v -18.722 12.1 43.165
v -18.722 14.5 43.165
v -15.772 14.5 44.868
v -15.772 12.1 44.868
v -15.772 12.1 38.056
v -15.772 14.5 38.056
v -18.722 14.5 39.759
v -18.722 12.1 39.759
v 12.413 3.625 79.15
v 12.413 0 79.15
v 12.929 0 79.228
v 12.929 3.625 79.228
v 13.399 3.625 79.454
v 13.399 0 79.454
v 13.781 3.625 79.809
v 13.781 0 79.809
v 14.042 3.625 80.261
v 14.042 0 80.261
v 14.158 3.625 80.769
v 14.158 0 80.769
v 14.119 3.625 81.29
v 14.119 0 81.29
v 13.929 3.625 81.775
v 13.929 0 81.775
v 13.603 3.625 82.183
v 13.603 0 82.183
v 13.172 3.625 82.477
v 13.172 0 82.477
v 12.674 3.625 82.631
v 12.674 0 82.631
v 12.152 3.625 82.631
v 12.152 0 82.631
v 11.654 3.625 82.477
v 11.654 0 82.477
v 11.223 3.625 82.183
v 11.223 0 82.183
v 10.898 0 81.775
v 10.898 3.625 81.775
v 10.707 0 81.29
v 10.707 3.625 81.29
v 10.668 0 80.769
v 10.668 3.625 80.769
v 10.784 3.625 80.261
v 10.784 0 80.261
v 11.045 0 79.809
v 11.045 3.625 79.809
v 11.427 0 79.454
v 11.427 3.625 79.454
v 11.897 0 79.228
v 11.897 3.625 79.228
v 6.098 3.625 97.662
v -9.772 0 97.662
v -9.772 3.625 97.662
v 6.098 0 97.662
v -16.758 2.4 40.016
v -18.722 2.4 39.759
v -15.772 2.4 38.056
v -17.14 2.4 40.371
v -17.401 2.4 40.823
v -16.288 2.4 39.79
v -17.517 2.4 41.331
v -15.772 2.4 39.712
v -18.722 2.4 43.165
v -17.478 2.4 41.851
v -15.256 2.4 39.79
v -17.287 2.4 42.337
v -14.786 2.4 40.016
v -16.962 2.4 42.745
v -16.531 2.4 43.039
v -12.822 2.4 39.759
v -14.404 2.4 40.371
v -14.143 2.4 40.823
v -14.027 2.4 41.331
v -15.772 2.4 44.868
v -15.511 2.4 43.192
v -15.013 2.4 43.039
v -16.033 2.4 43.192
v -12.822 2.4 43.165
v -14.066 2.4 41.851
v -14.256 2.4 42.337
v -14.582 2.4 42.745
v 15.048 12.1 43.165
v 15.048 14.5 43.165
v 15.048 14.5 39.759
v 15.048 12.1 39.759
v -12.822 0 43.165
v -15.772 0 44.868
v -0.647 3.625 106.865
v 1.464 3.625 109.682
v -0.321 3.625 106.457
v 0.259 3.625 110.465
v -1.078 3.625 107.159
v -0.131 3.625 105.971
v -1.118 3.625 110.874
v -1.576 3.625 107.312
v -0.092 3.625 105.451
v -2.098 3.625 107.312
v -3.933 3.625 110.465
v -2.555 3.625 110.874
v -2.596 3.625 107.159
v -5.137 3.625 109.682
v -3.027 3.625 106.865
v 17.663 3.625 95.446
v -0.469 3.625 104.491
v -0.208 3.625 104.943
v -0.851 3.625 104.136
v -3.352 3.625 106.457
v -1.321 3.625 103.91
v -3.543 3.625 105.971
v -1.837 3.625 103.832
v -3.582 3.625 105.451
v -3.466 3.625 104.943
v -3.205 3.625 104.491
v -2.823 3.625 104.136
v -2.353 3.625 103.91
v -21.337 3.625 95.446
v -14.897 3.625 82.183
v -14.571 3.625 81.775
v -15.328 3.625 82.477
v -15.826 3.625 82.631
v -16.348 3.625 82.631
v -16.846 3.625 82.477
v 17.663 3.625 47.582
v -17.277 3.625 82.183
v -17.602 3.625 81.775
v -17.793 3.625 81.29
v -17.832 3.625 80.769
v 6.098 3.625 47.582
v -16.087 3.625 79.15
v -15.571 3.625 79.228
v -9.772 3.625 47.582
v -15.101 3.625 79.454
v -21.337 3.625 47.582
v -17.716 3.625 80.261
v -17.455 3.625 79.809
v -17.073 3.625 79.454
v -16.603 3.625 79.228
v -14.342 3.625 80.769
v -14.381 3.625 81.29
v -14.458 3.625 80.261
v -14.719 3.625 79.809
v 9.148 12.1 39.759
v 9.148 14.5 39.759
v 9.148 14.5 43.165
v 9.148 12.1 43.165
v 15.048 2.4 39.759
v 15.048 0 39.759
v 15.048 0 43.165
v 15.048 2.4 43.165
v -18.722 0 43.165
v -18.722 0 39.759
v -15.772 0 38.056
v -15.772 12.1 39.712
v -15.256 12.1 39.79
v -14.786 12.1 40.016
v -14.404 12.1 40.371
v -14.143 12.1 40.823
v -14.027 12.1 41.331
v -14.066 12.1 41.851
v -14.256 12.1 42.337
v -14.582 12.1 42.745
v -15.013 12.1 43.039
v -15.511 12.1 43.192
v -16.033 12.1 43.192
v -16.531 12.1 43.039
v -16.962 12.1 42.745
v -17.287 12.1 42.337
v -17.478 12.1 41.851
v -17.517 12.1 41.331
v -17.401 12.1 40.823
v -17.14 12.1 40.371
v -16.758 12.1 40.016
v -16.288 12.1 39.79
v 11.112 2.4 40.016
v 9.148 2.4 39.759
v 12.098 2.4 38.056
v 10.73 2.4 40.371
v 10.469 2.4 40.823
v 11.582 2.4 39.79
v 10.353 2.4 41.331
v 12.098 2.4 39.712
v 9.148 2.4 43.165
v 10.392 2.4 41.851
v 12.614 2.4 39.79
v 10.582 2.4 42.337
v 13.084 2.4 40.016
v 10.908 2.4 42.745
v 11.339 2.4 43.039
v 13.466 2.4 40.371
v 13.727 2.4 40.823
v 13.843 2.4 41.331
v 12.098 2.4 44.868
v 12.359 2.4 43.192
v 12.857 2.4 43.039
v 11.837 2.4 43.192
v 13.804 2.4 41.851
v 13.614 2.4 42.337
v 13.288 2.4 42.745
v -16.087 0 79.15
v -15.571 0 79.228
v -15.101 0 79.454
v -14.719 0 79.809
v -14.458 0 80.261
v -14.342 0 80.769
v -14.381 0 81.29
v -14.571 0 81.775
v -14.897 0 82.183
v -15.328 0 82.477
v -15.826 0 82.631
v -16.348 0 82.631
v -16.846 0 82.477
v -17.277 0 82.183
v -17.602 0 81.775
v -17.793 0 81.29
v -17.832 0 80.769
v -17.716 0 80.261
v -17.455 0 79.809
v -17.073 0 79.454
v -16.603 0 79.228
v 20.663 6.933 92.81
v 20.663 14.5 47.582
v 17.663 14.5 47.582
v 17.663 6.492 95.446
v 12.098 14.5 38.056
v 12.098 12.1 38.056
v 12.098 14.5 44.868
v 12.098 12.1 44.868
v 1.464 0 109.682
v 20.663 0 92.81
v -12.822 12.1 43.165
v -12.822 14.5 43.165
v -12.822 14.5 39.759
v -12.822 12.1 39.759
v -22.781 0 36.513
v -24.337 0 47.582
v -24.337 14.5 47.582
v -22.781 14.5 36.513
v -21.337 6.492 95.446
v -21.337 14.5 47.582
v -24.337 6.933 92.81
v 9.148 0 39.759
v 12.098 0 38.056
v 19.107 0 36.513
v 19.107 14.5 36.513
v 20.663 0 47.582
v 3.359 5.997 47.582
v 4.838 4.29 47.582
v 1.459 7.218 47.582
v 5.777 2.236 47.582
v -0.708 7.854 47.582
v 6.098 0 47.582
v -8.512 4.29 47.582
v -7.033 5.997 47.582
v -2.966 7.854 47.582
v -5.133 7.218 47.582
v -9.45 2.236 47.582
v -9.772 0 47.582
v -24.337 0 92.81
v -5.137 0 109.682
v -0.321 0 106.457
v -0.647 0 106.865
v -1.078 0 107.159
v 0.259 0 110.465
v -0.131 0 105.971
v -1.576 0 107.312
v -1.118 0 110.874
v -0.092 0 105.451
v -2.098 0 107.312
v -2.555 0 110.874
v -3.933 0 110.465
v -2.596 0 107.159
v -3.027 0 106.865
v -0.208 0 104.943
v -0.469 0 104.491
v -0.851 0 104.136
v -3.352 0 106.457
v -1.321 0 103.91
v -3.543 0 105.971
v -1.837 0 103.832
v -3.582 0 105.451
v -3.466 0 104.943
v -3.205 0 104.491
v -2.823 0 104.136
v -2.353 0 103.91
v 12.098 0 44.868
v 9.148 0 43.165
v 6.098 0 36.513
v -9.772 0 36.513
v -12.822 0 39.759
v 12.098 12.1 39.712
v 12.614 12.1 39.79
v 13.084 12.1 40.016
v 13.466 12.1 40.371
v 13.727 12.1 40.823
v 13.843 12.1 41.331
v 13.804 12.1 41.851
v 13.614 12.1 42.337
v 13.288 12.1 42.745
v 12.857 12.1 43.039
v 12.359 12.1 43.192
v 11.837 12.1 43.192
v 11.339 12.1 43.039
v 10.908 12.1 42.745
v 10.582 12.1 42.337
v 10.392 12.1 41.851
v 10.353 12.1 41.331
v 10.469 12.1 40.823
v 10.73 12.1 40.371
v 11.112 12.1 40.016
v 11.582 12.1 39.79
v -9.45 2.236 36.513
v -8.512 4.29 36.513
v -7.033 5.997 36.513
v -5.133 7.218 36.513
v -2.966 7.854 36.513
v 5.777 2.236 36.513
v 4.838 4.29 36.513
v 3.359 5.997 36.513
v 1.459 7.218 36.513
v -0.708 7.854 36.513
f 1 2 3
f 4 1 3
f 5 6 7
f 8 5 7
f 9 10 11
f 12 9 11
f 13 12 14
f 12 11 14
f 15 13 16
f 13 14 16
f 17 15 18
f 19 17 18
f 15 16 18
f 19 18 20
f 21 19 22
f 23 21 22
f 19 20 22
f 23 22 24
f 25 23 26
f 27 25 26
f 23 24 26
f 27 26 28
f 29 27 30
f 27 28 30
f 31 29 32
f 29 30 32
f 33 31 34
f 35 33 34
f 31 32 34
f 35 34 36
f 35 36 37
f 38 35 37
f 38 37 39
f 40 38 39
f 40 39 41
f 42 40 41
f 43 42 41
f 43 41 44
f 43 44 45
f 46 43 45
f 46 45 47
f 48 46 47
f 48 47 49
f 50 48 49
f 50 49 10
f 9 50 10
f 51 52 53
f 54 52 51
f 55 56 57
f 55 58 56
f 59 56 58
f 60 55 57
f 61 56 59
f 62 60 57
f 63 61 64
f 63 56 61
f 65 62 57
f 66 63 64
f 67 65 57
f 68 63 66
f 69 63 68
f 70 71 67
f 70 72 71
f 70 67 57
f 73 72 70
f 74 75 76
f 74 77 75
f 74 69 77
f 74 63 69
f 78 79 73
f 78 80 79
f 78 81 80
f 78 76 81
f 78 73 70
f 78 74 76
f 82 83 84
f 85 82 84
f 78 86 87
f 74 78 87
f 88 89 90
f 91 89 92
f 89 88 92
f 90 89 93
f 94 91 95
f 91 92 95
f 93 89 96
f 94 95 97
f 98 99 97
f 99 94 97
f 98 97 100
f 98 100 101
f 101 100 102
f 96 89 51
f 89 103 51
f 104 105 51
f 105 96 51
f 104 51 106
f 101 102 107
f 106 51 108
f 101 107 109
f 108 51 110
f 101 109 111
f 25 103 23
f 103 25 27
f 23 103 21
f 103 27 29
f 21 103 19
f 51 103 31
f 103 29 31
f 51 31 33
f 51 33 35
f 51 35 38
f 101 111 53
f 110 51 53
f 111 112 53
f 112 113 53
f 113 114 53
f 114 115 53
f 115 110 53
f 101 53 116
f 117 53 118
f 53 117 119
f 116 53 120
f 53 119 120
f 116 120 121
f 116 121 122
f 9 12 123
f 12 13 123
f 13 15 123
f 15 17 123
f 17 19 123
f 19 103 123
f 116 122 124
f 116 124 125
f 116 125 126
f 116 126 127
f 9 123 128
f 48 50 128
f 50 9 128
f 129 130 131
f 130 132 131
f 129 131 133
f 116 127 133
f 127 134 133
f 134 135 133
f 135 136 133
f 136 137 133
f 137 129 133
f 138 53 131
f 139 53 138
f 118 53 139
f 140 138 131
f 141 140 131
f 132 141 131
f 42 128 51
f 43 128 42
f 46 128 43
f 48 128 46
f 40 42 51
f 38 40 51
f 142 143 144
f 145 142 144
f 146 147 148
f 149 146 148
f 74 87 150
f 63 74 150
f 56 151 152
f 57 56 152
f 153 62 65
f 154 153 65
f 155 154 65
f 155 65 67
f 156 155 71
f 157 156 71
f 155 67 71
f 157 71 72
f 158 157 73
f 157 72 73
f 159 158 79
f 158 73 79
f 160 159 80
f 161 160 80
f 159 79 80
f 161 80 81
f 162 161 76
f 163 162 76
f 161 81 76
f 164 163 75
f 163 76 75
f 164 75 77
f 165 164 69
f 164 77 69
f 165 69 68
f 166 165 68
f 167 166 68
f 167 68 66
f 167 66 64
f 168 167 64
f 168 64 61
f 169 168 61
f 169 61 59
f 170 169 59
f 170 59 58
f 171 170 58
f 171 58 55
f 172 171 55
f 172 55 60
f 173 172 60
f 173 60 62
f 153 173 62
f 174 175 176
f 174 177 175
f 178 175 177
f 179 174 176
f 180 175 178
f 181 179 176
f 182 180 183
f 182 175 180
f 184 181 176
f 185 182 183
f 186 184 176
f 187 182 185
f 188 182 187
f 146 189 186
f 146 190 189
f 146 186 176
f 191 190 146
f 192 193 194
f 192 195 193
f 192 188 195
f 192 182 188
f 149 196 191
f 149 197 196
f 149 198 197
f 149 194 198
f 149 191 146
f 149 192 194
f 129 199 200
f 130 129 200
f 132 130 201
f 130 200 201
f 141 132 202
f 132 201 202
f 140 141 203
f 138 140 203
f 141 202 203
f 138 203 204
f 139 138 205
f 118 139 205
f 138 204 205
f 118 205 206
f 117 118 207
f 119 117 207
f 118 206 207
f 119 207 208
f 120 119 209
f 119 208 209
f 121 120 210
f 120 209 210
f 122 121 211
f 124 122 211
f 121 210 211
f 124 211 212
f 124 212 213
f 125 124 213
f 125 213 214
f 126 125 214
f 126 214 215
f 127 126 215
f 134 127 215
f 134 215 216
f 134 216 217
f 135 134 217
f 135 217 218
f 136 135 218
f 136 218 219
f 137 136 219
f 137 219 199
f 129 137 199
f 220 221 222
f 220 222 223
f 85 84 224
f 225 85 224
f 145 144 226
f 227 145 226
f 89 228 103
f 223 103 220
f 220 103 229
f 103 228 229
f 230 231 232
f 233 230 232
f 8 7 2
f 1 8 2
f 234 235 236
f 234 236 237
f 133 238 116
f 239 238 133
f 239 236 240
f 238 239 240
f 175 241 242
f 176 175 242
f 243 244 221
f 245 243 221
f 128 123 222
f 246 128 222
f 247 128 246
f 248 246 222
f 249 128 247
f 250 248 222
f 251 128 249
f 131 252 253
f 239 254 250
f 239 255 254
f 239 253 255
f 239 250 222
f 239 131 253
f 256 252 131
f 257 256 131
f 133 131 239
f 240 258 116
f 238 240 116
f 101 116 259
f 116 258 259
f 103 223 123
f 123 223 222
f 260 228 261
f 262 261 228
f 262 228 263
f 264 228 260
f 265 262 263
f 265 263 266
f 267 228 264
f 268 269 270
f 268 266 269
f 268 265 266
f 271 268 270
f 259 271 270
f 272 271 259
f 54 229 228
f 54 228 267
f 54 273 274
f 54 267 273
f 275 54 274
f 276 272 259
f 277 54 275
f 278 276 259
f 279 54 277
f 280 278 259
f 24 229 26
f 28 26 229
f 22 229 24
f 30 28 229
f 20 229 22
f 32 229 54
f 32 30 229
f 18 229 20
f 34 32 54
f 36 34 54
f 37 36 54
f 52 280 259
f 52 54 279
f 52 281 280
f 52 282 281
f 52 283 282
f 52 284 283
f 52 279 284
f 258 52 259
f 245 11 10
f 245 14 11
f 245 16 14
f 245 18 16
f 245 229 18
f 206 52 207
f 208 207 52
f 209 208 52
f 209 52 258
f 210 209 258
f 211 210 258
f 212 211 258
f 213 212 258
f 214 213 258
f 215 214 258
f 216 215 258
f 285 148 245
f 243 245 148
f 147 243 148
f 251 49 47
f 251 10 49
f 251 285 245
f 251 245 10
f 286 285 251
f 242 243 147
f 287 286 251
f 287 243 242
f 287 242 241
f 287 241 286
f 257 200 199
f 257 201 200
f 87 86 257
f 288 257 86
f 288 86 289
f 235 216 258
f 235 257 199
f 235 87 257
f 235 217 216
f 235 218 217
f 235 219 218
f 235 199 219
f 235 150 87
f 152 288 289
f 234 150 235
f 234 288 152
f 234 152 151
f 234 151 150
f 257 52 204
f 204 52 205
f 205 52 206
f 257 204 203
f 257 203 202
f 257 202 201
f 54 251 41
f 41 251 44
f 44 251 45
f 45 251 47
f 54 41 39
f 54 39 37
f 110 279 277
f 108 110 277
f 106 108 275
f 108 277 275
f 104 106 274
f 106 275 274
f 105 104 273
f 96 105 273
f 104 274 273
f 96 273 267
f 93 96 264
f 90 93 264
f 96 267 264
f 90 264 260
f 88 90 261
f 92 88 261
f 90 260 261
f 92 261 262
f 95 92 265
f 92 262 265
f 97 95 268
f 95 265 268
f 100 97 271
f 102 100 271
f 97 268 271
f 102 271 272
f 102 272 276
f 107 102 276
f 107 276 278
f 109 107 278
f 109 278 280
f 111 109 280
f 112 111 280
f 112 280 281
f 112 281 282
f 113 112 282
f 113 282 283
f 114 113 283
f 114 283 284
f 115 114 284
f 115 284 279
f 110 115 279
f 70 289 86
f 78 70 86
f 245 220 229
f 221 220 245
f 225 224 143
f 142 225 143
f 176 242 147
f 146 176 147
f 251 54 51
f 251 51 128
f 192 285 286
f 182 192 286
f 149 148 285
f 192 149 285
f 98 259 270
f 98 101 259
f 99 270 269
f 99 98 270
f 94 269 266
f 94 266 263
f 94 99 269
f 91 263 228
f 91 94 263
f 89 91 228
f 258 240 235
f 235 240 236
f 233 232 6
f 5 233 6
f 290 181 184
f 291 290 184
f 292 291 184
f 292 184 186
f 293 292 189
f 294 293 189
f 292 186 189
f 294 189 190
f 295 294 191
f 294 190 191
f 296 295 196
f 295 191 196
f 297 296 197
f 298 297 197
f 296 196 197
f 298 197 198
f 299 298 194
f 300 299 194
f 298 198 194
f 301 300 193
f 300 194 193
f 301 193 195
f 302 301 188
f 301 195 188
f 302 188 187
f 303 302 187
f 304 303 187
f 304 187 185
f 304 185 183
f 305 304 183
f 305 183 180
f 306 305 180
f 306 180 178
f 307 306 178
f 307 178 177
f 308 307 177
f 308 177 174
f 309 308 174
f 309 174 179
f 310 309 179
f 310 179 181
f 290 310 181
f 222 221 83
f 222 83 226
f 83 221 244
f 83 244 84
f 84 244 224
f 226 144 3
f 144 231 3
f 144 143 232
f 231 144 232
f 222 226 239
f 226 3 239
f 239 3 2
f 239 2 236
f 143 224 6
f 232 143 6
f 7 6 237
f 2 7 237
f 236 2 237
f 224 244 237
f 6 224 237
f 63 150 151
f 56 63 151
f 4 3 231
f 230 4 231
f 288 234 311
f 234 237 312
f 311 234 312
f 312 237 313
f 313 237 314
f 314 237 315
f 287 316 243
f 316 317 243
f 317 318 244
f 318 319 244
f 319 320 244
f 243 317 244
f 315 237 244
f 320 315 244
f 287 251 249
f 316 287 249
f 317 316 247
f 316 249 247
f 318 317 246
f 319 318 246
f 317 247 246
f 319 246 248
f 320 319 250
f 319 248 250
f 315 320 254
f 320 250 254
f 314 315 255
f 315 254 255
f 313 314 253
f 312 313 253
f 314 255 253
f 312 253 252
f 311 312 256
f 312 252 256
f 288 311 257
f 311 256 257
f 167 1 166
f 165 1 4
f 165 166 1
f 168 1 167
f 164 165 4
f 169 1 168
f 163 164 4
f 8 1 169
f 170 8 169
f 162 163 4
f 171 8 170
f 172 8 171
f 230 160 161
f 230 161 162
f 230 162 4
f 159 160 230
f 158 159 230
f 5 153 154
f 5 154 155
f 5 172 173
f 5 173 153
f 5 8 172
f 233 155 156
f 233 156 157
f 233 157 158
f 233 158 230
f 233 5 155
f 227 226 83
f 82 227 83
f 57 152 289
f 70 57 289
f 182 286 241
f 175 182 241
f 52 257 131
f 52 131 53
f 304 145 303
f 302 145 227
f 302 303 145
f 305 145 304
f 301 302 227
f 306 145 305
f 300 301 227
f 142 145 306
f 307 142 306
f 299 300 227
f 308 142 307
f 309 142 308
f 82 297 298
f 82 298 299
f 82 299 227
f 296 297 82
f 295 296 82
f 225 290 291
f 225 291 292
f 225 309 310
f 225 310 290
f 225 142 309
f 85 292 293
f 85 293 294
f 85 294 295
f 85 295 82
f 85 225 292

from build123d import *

# Parameters (mm, degrees)
BOSS_EXTRUDE3_DEPTH              = 14.5
SKETCH8_R                        = 7.935
CUT_EXTRUDE3_DEPTH               = 88
CUT_EXTRUDE9_DEPTH               = 2.4
F_39_0_13779528_DIAMETER_HOLE1_D = 3.500000112
CUT_EXTRUDE10_DEPTH              = 22.4
CUT_EXTRUDE11_DEPTH              = 2.4
BOSS_EXTRUDE7_DEPTH              = 3.625
F_39_0_13779528_DIAMETER_HOLE2_D = 3.500000112
BOSS_EXTRUDE10_DEPTH             = 3
BOSS_EXTRUDE11_DEPTH             = 3
CUT_EXTRUDE14_DEPTH              = 13
CUT_EXTRUDE15_DEPTH              = 13
FILLET1_R                        = 5


with BuildPart() as part:
    # Sketch6 → Boss-Extrude3 (new body)
    with BuildSketch(Plane(origin=(0, 0, 0), x_dir=(1, 0, 0), z_dir=(0, 1, 0))):
        Polygon((-16.836914056, 5.783353512), (13.163085944, 5.783353512), (20.663085944, -47.581919406), (-24.336914056, -47.581919406), align=None)
    extrude(amount=BOSS_EXTRUDE3_DEPTH)

    # Sketch8 → Cut-Extrude3 (cut)
    with BuildSketch(Plane.XY.offset(47.581919406)):
        with Locations((-1.836914056, 0)):
            Circle(SKETCH8_R)
    extrude(amount=-CUT_EXTRUDE3_DEPTH, mode=Mode.SUBTRACT)

    # Sketch18 → Cut-Extrude9 (cut)
    with BuildSketch(Plane(origin=(0, 14.5, 0), x_dir=(1, 0, 0), z_dir=(0, 1, 0))):
        Polygon((-15.771819769, -44.868285994), (-12.821819769, -43.1651027), (-12.821819769, -39.758736112), (-15.771819769, -38.055552818), (-18.721819769, -39.758736112), (-18.721819769, -43.1651027), align=None)
        Polygon((12.097991657, -44.868285994), (15.047991657, -43.1651027), (15.047991657, -39.758736112), (12.097991657, -38.055552818), (9.147991657, -39.758736112), (9.147991657, -43.1651027), align=None)
        Polygon((11.389331688, -26.016021021), (14.389331688, -24.283970214), (14.389331688, -20.819868599), (11.389331688, -19.087817791), (8.389331688, -20.819868599), (8.389331688, -24.283970214), align=None)
        Polygon((-15.0631598, -26.016021021), (-12.0631598, -24.283970214), (-12.0631598, -20.819868599), (-15.0631598, -19.087817791), (-18.0631598, -20.819868599), (-18.0631598, -24.283970214), align=None)
    extrude(amount=-CUT_EXTRUDE9_DEPTH, mode=Mode.SUBTRACT)

    # #39 (0.13779528) Diameter Hole1 (through all)
    with Locations(Plane(origin=(-15.0631598, 14.5, 22.551919406), x_dir=(0, 0, 1), z_dir=(0, 1, 0))):
        with Locations((0, 0), (0, 26.452491488), (18.91, -0.708659969), (18.91, 27.161151457)):
            Hole(F_39_0_13779528_DIAMETER_HOLE1_D / 2)

    # Sketch22 → Cut-Extrude10 (cut)
    with BuildSketch(Plane(origin=(0, 14.5, 0), x_dir=(1, 0, 0), z_dir=(0, 1, 0))):
        Polygon((-22.781301734, -36.51316259), (19.107473622, -36.51316259), (13.163085944, 5.783353512), (-16.836914056, 5.783353512), align=None)
    extrude(amount=-CUT_EXTRUDE10_DEPTH, mode=Mode.SUBTRACT)

    # Sketch24 → Cut-Extrude11 (cut)
    with BuildSketch(Plane.XZ):
        Polygon((-15.771819769, 38.055552818), (-12.821819769, 39.758736112), (-12.821819769, 43.1651027), (-15.771819769, 44.868285994), (-18.721819769, 43.1651027), (-18.721819769, 39.758736112), align=None)
        Polygon((12.097991657, 38.055552818), (15.047991657, 39.758736112), (15.047991657, 43.1651027), (12.097991657, 44.868285994), (9.147991657, 43.1651027), (9.147991657, 39.758736112), align=None)
    extrude(amount=-CUT_EXTRUDE11_DEPTH, mode=Mode.SUBTRACT)

    # Sketch27 → Boss-Extrude7 (add)
    with BuildSketch(Plane(origin=(0, 0, 0), x_dir=(1, 0, 0), z_dir=(0, 1, 0))):
        Polygon((6.098085944, -47.581919406), (20.663085944, -47.581919406), (20.663085944, -112.581919406), (-9.771914056, -112.581919406), (-24.336914056, -112.581919406), (-24.336914056, -47.581919406), (-9.771914056, -47.581919406), (-9.771914056, -97.661919406), (6.098085944, -97.661919406), align=None)
    extrude(amount=BOSS_EXTRUDE7_DEPTH)

    # #39 (0.13779528) Diameter Hole2 (through all)
    with Locations(Plane(origin=(-16.086914056, 3.625, 80.900195398), x_dir=(0, 0, 1), z_dir=(0, 1, 0))):
        with Locations((0, 0), (24.681724008, 14.25), (0, 28.5)):
            Hole(F_39_0_13779528_DIAMETER_HOLE2_D / 2)

    # Sketch39 → Boss-Extrude10 (add)
    with BuildSketch(Plane(origin=(20.663085944, 0, 0), x_dir=(0, 0, -1), z_dir=(1, 0, 0))):
        Polygon((-47.581919406, 14.5), (-112.581919406, 3.625), (-47.581919406, 3.625), align=None)
    extrude(amount=-BOSS_EXTRUDE10_DEPTH)

    # Sketch40 → Boss-Extrude11 (add)
    with BuildSketch(Plane.ZY.offset(24.336914056)):
        Polygon((47.581919406, 14.5), (112.581919406, 3.625), (47.581919406, 3.625), align=None)
    extrude(amount=-BOSS_EXTRUDE11_DEPTH)

    # Sketch43 → Cut-Extrude14 (cut)
    with BuildSketch(Plane.XZ):
        Polygon((-1.836914056, 112.581919406), (-24.336914056, 112.581919406), (-24.336914056, 92.810231668), align=None)
    extrude(amount=-CUT_EXTRUDE14_DEPTH, mode=Mode.SUBTRACT)

    # Sketch44 → Cut-Extrude15 (cut)
    with BuildSketch(Plane.XZ):
        Polygon((20.663085944, 92.810231668), (20.663085944, 112.581919406), (-1.836914056, 112.581919406), align=None)
    extrude(amount=-CUT_EXTRUDE15_DEPTH, mode=Mode.SUBTRACT)

    # Fillet1
    fillet1_edges = [part.edges().sort_by_distance(p)[0] for p in [
        (-1.836914056, 1.8125, 112.581919406),
    ]]
    fillet(fillet1_edges, radius=FILLET1_R)


solid = part.part
